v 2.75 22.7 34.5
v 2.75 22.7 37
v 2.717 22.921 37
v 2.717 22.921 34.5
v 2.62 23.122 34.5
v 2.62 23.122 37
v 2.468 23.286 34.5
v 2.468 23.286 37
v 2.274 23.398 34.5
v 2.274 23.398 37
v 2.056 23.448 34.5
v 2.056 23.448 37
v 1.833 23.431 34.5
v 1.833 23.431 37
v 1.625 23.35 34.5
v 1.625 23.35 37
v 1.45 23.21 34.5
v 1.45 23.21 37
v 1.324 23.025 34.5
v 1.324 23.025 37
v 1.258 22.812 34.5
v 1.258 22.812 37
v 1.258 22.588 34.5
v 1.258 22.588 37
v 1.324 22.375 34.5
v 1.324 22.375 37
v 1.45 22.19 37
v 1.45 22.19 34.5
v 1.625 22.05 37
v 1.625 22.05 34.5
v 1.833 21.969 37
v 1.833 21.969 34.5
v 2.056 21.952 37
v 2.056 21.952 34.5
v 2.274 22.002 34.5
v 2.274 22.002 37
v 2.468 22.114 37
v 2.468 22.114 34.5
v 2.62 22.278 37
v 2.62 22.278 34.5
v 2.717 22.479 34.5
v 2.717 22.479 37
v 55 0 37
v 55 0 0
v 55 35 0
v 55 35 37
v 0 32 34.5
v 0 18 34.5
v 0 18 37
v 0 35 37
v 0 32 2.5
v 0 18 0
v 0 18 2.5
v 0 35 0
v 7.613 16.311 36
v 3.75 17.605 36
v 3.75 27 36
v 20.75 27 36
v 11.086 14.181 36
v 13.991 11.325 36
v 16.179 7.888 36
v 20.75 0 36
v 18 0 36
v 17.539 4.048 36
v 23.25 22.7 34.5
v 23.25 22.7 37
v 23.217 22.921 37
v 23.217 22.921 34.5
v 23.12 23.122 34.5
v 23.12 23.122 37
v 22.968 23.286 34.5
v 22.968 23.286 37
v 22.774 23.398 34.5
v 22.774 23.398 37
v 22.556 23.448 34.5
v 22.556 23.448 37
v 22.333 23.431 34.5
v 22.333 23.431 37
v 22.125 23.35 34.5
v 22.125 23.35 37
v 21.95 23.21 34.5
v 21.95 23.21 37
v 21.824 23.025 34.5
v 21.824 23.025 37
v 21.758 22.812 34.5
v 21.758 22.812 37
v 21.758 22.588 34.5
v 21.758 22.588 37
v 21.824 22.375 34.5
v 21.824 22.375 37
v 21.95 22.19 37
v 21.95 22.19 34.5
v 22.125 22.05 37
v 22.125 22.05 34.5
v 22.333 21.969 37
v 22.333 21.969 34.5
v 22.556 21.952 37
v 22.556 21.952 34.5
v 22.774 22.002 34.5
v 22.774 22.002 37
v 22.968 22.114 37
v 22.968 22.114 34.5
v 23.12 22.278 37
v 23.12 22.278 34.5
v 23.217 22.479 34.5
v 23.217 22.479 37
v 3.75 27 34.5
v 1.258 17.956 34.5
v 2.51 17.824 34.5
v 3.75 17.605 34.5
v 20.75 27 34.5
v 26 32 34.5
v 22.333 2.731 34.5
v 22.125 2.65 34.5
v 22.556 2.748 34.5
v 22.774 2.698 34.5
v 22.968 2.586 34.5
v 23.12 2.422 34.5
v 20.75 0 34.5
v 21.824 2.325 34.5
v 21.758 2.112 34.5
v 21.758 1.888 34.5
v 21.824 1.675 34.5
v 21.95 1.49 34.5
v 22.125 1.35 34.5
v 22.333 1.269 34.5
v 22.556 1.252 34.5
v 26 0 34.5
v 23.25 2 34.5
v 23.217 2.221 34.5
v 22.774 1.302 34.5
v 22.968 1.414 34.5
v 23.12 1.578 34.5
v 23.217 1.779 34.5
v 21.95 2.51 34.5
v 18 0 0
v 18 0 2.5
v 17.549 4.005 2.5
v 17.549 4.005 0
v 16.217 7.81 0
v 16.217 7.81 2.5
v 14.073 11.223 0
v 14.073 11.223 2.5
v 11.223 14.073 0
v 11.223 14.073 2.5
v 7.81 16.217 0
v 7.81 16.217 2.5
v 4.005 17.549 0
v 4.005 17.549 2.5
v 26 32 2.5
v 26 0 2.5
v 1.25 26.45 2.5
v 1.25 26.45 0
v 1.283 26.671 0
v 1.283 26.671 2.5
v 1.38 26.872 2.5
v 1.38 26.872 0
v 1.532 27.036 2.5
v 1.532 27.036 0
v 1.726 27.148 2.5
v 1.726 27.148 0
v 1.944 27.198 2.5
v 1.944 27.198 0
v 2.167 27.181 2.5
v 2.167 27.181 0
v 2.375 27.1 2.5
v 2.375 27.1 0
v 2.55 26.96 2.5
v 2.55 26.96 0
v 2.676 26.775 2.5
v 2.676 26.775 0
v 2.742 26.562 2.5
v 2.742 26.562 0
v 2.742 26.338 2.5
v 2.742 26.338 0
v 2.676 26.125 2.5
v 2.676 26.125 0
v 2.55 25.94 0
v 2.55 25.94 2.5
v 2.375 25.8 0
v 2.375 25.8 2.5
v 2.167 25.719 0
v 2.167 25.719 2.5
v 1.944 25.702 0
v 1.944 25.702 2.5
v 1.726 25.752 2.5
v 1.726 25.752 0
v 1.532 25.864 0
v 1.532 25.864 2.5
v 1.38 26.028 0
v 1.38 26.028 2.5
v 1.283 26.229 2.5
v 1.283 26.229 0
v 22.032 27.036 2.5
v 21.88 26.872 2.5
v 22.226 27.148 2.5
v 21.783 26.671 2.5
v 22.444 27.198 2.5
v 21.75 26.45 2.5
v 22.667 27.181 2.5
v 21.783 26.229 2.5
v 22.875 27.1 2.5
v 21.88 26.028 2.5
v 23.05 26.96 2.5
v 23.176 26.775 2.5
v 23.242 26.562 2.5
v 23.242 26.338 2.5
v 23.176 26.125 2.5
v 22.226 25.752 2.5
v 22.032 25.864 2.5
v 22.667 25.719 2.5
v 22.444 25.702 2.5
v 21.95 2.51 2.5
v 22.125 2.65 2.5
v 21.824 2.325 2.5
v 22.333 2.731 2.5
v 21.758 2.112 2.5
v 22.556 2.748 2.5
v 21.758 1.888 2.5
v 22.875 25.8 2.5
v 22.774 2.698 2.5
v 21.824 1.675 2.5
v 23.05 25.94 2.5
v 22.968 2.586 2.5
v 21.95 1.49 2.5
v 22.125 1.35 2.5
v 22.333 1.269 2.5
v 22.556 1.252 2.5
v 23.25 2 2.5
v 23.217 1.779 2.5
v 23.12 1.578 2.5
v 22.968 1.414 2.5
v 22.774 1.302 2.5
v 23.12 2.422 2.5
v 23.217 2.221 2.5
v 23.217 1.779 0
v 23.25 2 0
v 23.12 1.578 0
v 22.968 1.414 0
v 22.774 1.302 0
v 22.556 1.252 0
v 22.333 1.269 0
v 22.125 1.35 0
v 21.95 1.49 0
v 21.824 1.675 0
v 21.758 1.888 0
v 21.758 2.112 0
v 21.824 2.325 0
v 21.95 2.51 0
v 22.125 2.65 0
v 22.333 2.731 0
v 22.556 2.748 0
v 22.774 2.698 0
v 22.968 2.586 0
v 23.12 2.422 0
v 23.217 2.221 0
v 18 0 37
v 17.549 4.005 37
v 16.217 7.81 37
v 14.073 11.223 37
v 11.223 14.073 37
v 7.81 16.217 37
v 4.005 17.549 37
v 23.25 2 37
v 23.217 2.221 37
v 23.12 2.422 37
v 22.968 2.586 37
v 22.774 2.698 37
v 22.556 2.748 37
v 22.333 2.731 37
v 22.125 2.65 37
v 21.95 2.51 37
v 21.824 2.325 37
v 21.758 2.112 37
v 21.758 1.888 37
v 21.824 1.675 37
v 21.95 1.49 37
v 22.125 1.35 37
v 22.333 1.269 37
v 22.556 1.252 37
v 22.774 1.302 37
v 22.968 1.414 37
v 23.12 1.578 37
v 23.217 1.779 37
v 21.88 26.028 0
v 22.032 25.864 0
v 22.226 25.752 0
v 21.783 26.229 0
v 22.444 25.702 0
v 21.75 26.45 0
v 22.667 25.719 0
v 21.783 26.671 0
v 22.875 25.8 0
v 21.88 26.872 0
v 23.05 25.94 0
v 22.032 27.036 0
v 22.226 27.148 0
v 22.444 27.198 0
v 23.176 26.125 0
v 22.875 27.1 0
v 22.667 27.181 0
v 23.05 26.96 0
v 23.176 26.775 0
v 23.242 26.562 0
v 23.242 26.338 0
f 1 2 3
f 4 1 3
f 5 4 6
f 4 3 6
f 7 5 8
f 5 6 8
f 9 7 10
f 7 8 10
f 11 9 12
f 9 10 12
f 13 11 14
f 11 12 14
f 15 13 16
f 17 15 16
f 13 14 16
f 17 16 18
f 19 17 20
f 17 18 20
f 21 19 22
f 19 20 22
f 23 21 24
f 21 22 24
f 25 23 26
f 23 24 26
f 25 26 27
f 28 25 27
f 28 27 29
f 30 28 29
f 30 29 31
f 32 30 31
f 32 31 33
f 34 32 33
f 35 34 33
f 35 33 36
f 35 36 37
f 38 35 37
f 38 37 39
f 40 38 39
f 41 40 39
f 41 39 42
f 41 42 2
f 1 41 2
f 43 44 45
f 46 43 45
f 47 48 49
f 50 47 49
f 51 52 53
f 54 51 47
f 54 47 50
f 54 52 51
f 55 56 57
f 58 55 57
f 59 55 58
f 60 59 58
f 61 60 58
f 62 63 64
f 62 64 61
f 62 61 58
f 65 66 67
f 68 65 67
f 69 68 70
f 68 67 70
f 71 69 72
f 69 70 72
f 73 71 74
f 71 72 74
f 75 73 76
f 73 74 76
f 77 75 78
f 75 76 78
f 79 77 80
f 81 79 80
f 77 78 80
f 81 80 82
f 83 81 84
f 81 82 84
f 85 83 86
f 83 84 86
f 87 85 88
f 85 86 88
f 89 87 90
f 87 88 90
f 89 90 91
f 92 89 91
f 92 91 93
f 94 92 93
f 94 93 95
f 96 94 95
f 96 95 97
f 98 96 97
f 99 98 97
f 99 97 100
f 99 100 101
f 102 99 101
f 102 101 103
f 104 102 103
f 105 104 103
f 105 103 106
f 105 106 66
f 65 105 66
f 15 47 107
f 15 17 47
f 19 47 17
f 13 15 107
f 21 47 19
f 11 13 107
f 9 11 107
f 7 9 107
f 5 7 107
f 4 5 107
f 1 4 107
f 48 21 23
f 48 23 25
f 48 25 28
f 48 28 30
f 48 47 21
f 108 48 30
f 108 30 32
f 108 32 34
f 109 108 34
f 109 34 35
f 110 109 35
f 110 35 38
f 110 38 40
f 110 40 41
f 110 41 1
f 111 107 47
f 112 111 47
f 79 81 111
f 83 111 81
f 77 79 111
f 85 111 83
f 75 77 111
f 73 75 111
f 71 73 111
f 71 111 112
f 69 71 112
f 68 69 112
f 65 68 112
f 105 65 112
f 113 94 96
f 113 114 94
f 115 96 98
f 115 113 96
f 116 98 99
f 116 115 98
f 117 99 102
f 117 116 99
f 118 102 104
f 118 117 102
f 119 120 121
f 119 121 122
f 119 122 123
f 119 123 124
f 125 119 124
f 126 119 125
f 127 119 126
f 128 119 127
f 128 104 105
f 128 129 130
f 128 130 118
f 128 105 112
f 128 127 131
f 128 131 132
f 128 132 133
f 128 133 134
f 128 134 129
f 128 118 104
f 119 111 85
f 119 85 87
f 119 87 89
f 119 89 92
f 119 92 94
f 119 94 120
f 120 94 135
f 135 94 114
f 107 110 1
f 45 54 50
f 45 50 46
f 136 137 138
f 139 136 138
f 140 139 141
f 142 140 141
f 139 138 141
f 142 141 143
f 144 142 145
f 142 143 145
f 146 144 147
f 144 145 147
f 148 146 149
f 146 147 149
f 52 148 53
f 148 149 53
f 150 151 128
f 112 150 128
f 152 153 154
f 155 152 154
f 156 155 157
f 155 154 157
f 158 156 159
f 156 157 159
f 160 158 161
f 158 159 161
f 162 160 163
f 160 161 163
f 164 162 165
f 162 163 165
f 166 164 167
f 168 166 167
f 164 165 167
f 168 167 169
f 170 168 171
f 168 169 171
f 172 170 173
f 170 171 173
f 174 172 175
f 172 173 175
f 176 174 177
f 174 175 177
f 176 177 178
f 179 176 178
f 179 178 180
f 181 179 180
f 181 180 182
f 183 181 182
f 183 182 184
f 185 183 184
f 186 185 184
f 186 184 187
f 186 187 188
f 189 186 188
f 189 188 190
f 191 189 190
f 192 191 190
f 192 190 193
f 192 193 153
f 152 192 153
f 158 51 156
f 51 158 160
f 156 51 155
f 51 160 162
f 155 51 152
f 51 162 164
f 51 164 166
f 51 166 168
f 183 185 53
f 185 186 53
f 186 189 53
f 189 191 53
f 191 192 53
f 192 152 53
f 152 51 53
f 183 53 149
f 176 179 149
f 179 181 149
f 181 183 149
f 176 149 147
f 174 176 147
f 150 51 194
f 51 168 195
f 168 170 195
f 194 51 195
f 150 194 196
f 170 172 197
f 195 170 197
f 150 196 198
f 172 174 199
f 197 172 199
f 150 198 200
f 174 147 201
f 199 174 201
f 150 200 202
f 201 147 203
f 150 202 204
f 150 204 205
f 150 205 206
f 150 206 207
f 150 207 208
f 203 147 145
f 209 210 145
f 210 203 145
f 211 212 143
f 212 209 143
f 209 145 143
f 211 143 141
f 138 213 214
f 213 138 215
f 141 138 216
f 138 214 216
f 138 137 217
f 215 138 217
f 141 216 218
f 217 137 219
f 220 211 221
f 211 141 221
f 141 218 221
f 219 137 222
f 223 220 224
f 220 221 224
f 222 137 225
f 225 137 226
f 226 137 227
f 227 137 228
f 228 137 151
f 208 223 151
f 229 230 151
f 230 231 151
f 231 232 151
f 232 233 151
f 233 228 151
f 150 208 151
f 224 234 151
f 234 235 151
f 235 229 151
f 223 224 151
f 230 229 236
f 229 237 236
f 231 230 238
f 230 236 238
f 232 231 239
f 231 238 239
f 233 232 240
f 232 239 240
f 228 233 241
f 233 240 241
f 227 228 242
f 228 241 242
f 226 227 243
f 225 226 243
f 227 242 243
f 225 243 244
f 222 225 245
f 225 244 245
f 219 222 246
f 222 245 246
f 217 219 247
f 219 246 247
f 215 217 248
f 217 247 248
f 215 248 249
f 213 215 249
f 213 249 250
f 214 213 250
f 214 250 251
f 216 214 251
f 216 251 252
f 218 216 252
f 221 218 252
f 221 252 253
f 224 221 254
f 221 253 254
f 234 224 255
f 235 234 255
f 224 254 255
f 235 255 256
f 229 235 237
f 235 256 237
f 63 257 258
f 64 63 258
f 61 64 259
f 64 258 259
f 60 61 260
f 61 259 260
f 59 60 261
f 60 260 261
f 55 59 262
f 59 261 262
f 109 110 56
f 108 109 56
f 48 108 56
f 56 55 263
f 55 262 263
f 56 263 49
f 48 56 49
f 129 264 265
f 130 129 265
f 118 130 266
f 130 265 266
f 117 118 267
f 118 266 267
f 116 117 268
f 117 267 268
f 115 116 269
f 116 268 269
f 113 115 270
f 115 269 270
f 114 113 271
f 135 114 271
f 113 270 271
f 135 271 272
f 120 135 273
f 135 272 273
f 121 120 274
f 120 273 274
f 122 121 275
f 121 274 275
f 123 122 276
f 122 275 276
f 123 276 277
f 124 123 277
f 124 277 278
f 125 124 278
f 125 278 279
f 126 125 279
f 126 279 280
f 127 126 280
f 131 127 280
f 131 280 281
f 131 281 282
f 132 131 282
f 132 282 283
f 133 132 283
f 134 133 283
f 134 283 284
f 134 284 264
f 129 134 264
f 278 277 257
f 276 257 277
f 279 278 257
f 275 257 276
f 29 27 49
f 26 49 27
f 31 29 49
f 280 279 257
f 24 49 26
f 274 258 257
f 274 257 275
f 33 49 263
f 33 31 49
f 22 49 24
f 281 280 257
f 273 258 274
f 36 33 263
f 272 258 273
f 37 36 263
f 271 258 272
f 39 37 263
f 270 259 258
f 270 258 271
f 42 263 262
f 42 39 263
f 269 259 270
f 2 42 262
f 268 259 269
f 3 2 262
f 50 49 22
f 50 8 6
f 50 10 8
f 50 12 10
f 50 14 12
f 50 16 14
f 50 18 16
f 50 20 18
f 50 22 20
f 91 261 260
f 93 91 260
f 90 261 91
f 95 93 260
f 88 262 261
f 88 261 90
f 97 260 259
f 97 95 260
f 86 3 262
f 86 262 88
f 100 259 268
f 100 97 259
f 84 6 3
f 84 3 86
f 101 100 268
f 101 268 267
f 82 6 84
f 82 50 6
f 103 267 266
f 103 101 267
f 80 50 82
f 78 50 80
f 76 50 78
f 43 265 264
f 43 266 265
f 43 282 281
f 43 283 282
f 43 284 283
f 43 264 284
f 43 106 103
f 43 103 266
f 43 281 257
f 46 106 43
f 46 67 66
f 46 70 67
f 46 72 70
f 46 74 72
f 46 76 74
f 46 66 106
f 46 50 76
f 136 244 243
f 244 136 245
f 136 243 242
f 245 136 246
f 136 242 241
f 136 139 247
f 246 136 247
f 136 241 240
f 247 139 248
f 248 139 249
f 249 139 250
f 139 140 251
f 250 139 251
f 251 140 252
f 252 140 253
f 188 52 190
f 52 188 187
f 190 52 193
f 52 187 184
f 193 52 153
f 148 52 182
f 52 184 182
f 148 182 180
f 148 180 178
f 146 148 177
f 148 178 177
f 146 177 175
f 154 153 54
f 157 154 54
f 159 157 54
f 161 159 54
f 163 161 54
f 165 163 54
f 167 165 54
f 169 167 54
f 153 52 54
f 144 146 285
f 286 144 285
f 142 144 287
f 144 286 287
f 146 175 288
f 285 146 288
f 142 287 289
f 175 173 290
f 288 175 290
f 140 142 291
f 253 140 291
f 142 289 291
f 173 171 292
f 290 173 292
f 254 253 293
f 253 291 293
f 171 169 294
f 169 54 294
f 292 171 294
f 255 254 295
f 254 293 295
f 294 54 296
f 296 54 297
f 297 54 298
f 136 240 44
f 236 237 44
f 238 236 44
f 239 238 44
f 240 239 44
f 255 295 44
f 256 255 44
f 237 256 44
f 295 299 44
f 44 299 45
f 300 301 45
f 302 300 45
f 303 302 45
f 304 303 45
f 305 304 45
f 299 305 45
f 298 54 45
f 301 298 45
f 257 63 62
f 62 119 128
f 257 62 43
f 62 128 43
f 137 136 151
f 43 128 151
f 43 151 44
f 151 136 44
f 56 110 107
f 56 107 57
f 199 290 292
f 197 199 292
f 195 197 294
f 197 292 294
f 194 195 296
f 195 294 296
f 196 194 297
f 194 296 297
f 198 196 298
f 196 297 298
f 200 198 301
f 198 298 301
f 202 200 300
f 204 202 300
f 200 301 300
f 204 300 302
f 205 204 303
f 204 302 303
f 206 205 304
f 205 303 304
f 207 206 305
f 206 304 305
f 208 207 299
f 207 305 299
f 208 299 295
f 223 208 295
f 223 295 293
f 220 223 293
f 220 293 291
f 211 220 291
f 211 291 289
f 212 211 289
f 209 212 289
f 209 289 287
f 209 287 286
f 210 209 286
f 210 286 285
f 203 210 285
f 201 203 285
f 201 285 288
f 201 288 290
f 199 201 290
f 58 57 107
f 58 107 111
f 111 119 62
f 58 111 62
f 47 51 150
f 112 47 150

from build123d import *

# Parameters (mm, degrees)
SKETCH_1_W          = 55
SKETCH_1_H          = 35
EXTRUDE_1_DEPTH     = 37
SKETCH_3_W          = 26
SKETCH_3_H          = 32
CUT_EXTRUDE_1_DEPTH = 32
CUT_EXTRUDE_2_REACH = 76.96
SKETCH_4_R          = 0.75
CUT_EXTRUDE_3_REACH = 76.96
SKETCH_5_R          = 0.75
SKETCH_6_W          = 17
SKETCH_6_H          = 1.5
CUT_EXTRUDE_4_DEPTH = 27
SKETCH_7_R          = 18
CUT_EXTRUDE_5_DEPTH = 75.959989328


with BuildPart() as part:
    # 草图1 → 凸台-拉伸1 (new body)
    with BuildSketch(Plane.XY):
        with Locations((27.5, 17.5)):
            Rectangle(SKETCH_1_W, SKETCH_1_H)
    extrude(amount=EXTRUDE_1_DEPTH)

    # 草图3 → 切除-拉伸1 (cut)
    with BuildSketch(Plane.XZ):
        with Locations((13, 18.5)):
            Rectangle(SKETCH_3_W, SKETCH_3_H)
    extrude(amount=-CUT_EXTRUDE_1_DEPTH, mode=Mode.SUBTRACT)

    # 草图4 → 切除-拉伸2 (cut, up to next)
    with BuildSketch(Plane.XY.offset(37), mode=Mode.PRIVATE) as cut_extrude_2_sk1:
        with Locations((2, 2)):
            Circle(SKETCH_4_R)
    cut_extrude_2_tool1 = extrude(cut_extrude_2_sk1.sketch, amount=-CUT_EXTRUDE_2_REACH, mode=Mode.PRIVATE) & part.part
    # 草图4 → 切除-拉伸2 (cut, up to next)
    with BuildSketch(Plane.XY.offset(37), mode=Mode.PRIVATE) as cut_extrude_2_sk2:
        with Locations((22.5, 2)):
            Circle(SKETCH_4_R)
    cut_extrude_2_tool2 = extrude(cut_extrude_2_sk2.sketch, amount=-CUT_EXTRUDE_2_REACH, mode=Mode.PRIVATE) & part.part
    # 草图4 → 切除-拉伸2 (cut, up to next)
    with BuildSketch(Plane.XY.offset(37), mode=Mode.PRIVATE) as cut_extrude_2_sk3:
        with Locations((22.5, 22.7)):
            Circle(SKETCH_4_R)
    cut_extrude_2_tool3 = extrude(cut_extrude_2_sk3.sketch, amount=-CUT_EXTRUDE_2_REACH, mode=Mode.PRIVATE) & part.part
    # 草图4 → 切除-拉伸2 (cut, up to next)
    with BuildSketch(Plane.XY.offset(37), mode=Mode.PRIVATE) as cut_extrude_2_sk4:
        with Locations((2, 22.7)):
            Circle(SKETCH_4_R)
    cut_extrude_2_tool4 = extrude(cut_extrude_2_sk4.sketch, amount=-CUT_EXTRUDE_2_REACH, mode=Mode.PRIVATE) & part.part
    add(cut_extrude_2_tool1.solids().sort_by_distance((2, 2, 37))[0], mode=Mode.SUBTRACT)
    add(cut_extrude_2_tool2.solids().sort_by_distance((22.5, 2, 37))[0], mode=Mode.SUBTRACT)
    add(cut_extrude_2_tool3.solids().sort_by_distance((22.5, 22.7, 37))[0], mode=Mode.SUBTRACT)
    add(cut_extrude_2_tool4.solids().sort_by_distance((2, 22.7, 37))[0], mode=Mode.SUBTRACT)

    # 草图5 → 切除-拉伸3 (cut, up to next)
    with BuildSketch(Plane(origin=(0, 0, 0), x_dir=(-1, 0, 0), z_dir=(0, 0, -1)), mode=Mode.PRIVATE) as cut_extrude_3_sk1:
        with Locations(Location((-22.5, 2, 0), (0, 0, 180))):
            Circle(SKETCH_5_R)
    cut_extrude_3_tool1 = extrude(cut_extrude_3_sk1.sketch, amount=-CUT_EXTRUDE_3_REACH, mode=Mode.PRIVATE) & part.part
    # 草图5 → 切除-拉伸3 (cut, up to next)
    with BuildSketch(Plane(origin=(0, 0, 0), x_dir=(-1, 0, 0), z_dir=(0, 0, -1)), mode=Mode.PRIVATE) as cut_extrude_3_sk2:
        with Locations(Location((-2, 2, 0), (0, 0, 180))):
            Circle(SKETCH_5_R)
    cut_extrude_3_tool2 = extrude(cut_extrude_3_sk2.sketch, amount=-CUT_EXTRUDE_3_REACH, mode=Mode.PRIVATE) & part.part
    # 草图5 → 切除-拉伸3 (cut, up to next)
    with BuildSketch(Plane(origin=(0, 0, 0), x_dir=(-1, 0, 0), z_dir=(0, 0, -1)), mode=Mode.PRIVATE) as cut_extrude_3_sk3:
        with Locations((-2, 26.45)):
            Circle(SKETCH_5_R)
    cut_extrude_3_tool3 = extrude(cut_extrude_3_sk3.sketch, amount=-CUT_EXTRUDE_3_REACH, mode=Mode.PRIVATE) & part.part
    # 草图5 → 切除-拉伸3 (cut, up to next)
    with BuildSketch(Plane(origin=(0, 0, 0), x_dir=(-1, 0, 0), z_dir=(0, 0, -1)), mode=Mode.PRIVATE) as cut_extrude_3_sk4:
        with Locations((-22.5, 26.45)):
            Circle(SKETCH_5_R)
    cut_extrude_3_tool4 = extrude(cut_extrude_3_sk4.sketch, amount=-CUT_EXTRUDE_3_REACH, mode=Mode.PRIVATE) & part.part
    add(cut_extrude_3_tool1.solids().sort_by_distance((22.5, 2, 0))[0], mode=Mode.SUBTRACT)
    add(cut_extrude_3_tool2.solids().sort_by_distance((2, 2, 0))[0], mode=Mode.SUBTRACT)
    add(cut_extrude_3_tool3.solids().sort_by_distance((2, 26.45, 0))[0], mode=Mode.SUBTRACT)
    add(cut_extrude_3_tool4.solids().sort_by_distance((22.5, 26.45, 0))[0], mode=Mode.SUBTRACT)

    # 草图6 → 切除-拉伸4 (cut)
    with BuildSketch(Plane.XZ):
        with Locations((12.25, 35.25)):
            Rectangle(SKETCH_6_W, SKETCH_6_H)
    extrude(amount=-CUT_EXTRUDE_4_DEPTH, mode=Mode.SUBTRACT)

    # 草图7 → 切除-拉伸5 (cut, through all)
    with BuildSketch(Plane.XY.offset(37)):
        Circle(SKETCH_7_R)
    extrude(amount=-CUT_EXTRUDE_5_DEPTH, mode=Mode.SUBTRACT)


solid = part.part
